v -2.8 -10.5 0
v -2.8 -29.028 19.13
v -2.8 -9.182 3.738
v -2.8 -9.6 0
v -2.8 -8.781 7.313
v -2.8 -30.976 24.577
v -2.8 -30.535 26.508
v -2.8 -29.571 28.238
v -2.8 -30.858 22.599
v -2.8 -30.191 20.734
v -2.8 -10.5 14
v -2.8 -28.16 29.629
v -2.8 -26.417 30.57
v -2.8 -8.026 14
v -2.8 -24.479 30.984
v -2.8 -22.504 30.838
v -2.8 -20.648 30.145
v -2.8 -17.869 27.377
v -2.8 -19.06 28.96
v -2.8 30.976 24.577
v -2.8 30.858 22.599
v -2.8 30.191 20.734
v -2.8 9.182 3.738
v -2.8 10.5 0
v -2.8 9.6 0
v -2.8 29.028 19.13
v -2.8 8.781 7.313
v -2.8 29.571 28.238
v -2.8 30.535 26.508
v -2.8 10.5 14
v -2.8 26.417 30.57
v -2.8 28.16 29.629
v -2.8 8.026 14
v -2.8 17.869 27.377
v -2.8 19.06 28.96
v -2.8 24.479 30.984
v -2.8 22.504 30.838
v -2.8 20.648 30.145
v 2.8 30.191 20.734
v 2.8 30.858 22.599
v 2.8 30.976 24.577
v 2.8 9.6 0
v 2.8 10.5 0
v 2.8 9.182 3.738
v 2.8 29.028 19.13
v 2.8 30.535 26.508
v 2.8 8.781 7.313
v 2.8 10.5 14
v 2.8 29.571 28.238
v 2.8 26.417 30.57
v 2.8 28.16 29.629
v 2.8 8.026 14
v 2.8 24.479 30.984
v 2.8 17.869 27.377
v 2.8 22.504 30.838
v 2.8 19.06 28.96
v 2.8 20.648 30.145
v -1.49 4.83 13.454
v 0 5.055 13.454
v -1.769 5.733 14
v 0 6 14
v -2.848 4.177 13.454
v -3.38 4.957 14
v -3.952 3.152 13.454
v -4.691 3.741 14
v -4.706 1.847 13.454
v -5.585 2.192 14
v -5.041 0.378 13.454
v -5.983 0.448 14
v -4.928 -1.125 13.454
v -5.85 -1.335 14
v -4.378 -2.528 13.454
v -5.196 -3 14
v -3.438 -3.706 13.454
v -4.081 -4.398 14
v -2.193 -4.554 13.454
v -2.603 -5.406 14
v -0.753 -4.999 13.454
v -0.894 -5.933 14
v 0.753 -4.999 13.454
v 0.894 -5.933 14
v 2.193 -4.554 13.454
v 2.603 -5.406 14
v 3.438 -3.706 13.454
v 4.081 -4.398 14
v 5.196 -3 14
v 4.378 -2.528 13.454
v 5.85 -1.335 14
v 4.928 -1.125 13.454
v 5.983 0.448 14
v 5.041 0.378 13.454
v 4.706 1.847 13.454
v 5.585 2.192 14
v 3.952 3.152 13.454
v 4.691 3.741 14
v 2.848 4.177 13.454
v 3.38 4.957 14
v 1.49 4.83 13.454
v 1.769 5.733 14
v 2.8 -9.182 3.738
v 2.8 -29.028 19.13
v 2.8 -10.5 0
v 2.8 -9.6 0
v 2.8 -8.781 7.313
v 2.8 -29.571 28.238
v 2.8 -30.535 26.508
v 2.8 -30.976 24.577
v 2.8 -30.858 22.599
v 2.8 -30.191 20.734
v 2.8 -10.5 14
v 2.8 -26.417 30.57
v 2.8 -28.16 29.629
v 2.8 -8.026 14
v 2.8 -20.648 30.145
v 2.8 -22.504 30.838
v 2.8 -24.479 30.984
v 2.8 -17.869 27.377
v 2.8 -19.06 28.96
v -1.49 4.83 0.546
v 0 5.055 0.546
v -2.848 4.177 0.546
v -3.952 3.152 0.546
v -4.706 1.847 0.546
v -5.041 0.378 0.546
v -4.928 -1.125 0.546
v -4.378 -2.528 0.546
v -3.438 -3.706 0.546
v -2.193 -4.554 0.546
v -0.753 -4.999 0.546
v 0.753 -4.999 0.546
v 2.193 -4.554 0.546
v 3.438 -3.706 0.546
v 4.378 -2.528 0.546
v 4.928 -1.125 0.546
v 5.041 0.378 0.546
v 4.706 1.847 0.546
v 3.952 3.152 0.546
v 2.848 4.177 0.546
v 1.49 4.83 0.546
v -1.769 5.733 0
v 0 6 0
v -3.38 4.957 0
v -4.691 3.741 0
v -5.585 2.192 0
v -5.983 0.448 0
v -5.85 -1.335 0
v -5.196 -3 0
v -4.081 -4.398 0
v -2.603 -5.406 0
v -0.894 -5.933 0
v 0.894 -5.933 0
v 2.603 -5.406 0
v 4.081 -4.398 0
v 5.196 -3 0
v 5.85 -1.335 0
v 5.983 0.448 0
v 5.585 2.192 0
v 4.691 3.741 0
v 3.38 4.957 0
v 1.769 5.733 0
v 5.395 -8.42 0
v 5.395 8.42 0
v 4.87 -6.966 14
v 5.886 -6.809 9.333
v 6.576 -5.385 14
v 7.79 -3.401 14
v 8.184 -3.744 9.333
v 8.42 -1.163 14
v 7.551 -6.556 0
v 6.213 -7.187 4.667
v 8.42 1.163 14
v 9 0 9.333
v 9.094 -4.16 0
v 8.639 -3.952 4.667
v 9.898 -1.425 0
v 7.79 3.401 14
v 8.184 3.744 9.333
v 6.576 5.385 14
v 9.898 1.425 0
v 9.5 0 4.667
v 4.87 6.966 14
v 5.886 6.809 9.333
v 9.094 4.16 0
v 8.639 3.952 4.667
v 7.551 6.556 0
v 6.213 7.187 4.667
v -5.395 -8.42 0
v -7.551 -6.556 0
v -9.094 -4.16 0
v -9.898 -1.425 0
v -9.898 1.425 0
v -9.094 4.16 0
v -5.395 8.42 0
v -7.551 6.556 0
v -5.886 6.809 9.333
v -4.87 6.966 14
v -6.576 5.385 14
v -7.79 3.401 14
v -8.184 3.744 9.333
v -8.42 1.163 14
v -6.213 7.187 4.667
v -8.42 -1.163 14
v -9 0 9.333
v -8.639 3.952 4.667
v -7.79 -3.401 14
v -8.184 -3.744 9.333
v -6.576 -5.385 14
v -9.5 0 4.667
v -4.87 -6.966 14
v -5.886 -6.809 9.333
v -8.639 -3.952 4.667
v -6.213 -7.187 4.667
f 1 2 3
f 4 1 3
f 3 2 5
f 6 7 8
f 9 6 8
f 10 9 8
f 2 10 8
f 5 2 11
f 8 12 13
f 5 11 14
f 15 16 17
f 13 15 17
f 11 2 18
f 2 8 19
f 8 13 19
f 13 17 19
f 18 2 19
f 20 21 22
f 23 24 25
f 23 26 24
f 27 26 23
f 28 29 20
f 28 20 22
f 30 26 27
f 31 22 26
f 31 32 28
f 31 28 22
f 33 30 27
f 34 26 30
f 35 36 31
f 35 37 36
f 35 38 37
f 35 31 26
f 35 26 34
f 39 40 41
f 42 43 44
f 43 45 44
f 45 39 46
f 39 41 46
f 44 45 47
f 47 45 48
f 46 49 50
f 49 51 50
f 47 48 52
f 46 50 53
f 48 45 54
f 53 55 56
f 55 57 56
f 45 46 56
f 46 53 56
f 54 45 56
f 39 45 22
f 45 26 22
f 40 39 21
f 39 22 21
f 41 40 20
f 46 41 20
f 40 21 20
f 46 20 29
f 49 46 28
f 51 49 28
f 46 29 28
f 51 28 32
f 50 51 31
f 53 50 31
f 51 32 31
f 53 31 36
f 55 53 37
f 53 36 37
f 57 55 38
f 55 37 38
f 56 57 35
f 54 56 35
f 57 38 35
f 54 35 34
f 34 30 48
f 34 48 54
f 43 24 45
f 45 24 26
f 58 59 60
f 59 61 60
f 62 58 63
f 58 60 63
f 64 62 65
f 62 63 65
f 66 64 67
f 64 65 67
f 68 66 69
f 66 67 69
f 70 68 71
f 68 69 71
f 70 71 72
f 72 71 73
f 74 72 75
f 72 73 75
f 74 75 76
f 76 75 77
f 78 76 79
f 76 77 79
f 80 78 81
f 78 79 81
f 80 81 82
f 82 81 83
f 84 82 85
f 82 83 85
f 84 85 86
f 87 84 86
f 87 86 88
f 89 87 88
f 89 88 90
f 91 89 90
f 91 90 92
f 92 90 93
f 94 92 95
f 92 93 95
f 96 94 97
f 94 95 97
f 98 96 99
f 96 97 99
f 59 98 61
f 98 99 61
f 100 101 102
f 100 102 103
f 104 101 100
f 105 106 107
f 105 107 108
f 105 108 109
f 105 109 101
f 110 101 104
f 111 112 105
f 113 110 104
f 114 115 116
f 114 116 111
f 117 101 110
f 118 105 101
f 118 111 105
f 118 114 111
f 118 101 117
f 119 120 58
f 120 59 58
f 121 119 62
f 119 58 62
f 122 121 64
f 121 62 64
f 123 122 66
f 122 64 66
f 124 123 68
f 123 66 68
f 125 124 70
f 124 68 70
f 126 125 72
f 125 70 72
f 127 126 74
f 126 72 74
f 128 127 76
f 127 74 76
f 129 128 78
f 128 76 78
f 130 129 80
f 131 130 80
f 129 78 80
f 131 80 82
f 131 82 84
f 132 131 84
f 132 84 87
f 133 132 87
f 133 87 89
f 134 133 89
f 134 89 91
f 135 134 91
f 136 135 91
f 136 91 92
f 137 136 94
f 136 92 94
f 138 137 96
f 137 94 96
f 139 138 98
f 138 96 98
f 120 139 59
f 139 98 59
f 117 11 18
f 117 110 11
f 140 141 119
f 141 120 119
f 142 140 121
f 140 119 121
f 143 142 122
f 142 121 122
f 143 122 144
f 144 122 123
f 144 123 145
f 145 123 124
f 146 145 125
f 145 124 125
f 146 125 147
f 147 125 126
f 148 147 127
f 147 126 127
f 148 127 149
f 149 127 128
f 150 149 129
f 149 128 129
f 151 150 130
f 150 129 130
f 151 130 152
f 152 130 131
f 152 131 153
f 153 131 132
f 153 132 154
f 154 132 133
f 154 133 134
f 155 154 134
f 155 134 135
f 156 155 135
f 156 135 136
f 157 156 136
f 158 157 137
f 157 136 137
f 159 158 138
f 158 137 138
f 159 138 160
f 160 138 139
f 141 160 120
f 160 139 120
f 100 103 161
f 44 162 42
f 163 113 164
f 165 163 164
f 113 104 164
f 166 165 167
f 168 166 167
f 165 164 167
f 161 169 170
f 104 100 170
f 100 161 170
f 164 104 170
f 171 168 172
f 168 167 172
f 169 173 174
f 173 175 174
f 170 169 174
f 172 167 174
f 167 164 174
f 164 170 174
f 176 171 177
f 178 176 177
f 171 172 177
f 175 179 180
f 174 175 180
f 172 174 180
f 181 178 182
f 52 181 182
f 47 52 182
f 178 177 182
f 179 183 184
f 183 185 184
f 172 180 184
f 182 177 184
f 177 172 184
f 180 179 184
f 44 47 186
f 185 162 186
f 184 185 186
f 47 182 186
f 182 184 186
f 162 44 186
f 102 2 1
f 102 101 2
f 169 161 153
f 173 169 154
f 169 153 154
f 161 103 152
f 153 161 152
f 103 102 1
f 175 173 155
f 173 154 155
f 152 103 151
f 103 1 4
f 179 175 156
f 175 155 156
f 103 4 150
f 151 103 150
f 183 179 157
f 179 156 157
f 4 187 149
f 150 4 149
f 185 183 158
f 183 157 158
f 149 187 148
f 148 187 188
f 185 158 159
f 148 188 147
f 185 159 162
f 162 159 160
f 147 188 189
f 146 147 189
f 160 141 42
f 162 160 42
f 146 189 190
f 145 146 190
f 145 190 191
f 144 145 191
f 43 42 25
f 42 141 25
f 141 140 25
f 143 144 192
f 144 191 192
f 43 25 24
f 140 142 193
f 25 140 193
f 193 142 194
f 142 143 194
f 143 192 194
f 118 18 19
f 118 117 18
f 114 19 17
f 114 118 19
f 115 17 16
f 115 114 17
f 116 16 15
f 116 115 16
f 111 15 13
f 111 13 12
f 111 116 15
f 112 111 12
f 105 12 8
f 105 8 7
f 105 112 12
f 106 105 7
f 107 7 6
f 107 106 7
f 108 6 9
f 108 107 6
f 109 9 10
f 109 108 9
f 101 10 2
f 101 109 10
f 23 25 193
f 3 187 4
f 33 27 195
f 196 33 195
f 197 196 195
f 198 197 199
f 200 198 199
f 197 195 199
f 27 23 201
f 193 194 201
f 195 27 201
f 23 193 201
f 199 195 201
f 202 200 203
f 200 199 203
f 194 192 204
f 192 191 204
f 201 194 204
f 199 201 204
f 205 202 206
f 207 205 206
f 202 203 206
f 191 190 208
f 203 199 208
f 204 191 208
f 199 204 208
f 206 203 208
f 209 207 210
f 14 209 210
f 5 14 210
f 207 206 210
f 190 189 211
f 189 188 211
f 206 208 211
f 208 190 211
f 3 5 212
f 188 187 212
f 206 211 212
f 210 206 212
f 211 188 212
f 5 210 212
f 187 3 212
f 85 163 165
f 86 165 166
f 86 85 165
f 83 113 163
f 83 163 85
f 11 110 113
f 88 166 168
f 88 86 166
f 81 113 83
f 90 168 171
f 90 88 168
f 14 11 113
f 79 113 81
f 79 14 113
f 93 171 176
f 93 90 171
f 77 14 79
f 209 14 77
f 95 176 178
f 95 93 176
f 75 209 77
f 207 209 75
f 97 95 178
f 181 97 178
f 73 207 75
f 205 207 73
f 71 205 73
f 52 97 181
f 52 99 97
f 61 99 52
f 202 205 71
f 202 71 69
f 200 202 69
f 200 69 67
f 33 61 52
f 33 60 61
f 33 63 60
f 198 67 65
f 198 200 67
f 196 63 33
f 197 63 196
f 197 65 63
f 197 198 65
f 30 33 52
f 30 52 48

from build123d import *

# Parameters (mm, degrees)
PAD_DEPTH = 2.8


with BuildPart() as pad:
    # Sketch001 → Pad (new body, symmetric)
    with BuildSketch(Plane.YZ):
        with BuildLine():
            Line((6.5, 0), (6.5, 14))
            Line((6.5, 14), (10.5, 14))
            Line((10.5, 14), (17.86865, 27.377357))
            ThreePointArc((29.028201, 19.12997), (28.160419, 29.629469), (17.86865, 27.377357))
            Line((10.5, 0), (29.028201, 19.12997))
            Line((6.5, 0), (10.5, 0))
        make_face()
        with BuildLine():
            Line((-29.028193, 19.12994), (-10.49996, 0))
            Line((-10.49996, 0), (-6.49996, 0))
            Line((-6.49996, 0), (-6.49996, 14))
            Line((-6.49996, 14), (-10.49996, 14))
            Line((-10.49996, 14), (-17.86865, 27.377335))
            ThreePointArc((-17.86865, 27.377335), (-28.160423, 29.629443), (-29.028193, 19.12994))
        make_face()
    extrude(amount=PAD_DEPTH, both=True)


with BuildPart() as fl_gelmutter_din_315_m12:
    # Sketch → Revolution (revolve)
    with BuildSketch(Plane.YZ):
        Polygon((6, 0), (5.055, 0.545596), (5.055, 13.454404), (6, 14), (8.5, 14), (10, 0), align=None)
    revolve(axis=Axis((0, 0, 0), (0, 0, 1)))

    # Fusion: union Pad
    add(pad.part)


solid = fl_gelmutter_din_315_m12.part
